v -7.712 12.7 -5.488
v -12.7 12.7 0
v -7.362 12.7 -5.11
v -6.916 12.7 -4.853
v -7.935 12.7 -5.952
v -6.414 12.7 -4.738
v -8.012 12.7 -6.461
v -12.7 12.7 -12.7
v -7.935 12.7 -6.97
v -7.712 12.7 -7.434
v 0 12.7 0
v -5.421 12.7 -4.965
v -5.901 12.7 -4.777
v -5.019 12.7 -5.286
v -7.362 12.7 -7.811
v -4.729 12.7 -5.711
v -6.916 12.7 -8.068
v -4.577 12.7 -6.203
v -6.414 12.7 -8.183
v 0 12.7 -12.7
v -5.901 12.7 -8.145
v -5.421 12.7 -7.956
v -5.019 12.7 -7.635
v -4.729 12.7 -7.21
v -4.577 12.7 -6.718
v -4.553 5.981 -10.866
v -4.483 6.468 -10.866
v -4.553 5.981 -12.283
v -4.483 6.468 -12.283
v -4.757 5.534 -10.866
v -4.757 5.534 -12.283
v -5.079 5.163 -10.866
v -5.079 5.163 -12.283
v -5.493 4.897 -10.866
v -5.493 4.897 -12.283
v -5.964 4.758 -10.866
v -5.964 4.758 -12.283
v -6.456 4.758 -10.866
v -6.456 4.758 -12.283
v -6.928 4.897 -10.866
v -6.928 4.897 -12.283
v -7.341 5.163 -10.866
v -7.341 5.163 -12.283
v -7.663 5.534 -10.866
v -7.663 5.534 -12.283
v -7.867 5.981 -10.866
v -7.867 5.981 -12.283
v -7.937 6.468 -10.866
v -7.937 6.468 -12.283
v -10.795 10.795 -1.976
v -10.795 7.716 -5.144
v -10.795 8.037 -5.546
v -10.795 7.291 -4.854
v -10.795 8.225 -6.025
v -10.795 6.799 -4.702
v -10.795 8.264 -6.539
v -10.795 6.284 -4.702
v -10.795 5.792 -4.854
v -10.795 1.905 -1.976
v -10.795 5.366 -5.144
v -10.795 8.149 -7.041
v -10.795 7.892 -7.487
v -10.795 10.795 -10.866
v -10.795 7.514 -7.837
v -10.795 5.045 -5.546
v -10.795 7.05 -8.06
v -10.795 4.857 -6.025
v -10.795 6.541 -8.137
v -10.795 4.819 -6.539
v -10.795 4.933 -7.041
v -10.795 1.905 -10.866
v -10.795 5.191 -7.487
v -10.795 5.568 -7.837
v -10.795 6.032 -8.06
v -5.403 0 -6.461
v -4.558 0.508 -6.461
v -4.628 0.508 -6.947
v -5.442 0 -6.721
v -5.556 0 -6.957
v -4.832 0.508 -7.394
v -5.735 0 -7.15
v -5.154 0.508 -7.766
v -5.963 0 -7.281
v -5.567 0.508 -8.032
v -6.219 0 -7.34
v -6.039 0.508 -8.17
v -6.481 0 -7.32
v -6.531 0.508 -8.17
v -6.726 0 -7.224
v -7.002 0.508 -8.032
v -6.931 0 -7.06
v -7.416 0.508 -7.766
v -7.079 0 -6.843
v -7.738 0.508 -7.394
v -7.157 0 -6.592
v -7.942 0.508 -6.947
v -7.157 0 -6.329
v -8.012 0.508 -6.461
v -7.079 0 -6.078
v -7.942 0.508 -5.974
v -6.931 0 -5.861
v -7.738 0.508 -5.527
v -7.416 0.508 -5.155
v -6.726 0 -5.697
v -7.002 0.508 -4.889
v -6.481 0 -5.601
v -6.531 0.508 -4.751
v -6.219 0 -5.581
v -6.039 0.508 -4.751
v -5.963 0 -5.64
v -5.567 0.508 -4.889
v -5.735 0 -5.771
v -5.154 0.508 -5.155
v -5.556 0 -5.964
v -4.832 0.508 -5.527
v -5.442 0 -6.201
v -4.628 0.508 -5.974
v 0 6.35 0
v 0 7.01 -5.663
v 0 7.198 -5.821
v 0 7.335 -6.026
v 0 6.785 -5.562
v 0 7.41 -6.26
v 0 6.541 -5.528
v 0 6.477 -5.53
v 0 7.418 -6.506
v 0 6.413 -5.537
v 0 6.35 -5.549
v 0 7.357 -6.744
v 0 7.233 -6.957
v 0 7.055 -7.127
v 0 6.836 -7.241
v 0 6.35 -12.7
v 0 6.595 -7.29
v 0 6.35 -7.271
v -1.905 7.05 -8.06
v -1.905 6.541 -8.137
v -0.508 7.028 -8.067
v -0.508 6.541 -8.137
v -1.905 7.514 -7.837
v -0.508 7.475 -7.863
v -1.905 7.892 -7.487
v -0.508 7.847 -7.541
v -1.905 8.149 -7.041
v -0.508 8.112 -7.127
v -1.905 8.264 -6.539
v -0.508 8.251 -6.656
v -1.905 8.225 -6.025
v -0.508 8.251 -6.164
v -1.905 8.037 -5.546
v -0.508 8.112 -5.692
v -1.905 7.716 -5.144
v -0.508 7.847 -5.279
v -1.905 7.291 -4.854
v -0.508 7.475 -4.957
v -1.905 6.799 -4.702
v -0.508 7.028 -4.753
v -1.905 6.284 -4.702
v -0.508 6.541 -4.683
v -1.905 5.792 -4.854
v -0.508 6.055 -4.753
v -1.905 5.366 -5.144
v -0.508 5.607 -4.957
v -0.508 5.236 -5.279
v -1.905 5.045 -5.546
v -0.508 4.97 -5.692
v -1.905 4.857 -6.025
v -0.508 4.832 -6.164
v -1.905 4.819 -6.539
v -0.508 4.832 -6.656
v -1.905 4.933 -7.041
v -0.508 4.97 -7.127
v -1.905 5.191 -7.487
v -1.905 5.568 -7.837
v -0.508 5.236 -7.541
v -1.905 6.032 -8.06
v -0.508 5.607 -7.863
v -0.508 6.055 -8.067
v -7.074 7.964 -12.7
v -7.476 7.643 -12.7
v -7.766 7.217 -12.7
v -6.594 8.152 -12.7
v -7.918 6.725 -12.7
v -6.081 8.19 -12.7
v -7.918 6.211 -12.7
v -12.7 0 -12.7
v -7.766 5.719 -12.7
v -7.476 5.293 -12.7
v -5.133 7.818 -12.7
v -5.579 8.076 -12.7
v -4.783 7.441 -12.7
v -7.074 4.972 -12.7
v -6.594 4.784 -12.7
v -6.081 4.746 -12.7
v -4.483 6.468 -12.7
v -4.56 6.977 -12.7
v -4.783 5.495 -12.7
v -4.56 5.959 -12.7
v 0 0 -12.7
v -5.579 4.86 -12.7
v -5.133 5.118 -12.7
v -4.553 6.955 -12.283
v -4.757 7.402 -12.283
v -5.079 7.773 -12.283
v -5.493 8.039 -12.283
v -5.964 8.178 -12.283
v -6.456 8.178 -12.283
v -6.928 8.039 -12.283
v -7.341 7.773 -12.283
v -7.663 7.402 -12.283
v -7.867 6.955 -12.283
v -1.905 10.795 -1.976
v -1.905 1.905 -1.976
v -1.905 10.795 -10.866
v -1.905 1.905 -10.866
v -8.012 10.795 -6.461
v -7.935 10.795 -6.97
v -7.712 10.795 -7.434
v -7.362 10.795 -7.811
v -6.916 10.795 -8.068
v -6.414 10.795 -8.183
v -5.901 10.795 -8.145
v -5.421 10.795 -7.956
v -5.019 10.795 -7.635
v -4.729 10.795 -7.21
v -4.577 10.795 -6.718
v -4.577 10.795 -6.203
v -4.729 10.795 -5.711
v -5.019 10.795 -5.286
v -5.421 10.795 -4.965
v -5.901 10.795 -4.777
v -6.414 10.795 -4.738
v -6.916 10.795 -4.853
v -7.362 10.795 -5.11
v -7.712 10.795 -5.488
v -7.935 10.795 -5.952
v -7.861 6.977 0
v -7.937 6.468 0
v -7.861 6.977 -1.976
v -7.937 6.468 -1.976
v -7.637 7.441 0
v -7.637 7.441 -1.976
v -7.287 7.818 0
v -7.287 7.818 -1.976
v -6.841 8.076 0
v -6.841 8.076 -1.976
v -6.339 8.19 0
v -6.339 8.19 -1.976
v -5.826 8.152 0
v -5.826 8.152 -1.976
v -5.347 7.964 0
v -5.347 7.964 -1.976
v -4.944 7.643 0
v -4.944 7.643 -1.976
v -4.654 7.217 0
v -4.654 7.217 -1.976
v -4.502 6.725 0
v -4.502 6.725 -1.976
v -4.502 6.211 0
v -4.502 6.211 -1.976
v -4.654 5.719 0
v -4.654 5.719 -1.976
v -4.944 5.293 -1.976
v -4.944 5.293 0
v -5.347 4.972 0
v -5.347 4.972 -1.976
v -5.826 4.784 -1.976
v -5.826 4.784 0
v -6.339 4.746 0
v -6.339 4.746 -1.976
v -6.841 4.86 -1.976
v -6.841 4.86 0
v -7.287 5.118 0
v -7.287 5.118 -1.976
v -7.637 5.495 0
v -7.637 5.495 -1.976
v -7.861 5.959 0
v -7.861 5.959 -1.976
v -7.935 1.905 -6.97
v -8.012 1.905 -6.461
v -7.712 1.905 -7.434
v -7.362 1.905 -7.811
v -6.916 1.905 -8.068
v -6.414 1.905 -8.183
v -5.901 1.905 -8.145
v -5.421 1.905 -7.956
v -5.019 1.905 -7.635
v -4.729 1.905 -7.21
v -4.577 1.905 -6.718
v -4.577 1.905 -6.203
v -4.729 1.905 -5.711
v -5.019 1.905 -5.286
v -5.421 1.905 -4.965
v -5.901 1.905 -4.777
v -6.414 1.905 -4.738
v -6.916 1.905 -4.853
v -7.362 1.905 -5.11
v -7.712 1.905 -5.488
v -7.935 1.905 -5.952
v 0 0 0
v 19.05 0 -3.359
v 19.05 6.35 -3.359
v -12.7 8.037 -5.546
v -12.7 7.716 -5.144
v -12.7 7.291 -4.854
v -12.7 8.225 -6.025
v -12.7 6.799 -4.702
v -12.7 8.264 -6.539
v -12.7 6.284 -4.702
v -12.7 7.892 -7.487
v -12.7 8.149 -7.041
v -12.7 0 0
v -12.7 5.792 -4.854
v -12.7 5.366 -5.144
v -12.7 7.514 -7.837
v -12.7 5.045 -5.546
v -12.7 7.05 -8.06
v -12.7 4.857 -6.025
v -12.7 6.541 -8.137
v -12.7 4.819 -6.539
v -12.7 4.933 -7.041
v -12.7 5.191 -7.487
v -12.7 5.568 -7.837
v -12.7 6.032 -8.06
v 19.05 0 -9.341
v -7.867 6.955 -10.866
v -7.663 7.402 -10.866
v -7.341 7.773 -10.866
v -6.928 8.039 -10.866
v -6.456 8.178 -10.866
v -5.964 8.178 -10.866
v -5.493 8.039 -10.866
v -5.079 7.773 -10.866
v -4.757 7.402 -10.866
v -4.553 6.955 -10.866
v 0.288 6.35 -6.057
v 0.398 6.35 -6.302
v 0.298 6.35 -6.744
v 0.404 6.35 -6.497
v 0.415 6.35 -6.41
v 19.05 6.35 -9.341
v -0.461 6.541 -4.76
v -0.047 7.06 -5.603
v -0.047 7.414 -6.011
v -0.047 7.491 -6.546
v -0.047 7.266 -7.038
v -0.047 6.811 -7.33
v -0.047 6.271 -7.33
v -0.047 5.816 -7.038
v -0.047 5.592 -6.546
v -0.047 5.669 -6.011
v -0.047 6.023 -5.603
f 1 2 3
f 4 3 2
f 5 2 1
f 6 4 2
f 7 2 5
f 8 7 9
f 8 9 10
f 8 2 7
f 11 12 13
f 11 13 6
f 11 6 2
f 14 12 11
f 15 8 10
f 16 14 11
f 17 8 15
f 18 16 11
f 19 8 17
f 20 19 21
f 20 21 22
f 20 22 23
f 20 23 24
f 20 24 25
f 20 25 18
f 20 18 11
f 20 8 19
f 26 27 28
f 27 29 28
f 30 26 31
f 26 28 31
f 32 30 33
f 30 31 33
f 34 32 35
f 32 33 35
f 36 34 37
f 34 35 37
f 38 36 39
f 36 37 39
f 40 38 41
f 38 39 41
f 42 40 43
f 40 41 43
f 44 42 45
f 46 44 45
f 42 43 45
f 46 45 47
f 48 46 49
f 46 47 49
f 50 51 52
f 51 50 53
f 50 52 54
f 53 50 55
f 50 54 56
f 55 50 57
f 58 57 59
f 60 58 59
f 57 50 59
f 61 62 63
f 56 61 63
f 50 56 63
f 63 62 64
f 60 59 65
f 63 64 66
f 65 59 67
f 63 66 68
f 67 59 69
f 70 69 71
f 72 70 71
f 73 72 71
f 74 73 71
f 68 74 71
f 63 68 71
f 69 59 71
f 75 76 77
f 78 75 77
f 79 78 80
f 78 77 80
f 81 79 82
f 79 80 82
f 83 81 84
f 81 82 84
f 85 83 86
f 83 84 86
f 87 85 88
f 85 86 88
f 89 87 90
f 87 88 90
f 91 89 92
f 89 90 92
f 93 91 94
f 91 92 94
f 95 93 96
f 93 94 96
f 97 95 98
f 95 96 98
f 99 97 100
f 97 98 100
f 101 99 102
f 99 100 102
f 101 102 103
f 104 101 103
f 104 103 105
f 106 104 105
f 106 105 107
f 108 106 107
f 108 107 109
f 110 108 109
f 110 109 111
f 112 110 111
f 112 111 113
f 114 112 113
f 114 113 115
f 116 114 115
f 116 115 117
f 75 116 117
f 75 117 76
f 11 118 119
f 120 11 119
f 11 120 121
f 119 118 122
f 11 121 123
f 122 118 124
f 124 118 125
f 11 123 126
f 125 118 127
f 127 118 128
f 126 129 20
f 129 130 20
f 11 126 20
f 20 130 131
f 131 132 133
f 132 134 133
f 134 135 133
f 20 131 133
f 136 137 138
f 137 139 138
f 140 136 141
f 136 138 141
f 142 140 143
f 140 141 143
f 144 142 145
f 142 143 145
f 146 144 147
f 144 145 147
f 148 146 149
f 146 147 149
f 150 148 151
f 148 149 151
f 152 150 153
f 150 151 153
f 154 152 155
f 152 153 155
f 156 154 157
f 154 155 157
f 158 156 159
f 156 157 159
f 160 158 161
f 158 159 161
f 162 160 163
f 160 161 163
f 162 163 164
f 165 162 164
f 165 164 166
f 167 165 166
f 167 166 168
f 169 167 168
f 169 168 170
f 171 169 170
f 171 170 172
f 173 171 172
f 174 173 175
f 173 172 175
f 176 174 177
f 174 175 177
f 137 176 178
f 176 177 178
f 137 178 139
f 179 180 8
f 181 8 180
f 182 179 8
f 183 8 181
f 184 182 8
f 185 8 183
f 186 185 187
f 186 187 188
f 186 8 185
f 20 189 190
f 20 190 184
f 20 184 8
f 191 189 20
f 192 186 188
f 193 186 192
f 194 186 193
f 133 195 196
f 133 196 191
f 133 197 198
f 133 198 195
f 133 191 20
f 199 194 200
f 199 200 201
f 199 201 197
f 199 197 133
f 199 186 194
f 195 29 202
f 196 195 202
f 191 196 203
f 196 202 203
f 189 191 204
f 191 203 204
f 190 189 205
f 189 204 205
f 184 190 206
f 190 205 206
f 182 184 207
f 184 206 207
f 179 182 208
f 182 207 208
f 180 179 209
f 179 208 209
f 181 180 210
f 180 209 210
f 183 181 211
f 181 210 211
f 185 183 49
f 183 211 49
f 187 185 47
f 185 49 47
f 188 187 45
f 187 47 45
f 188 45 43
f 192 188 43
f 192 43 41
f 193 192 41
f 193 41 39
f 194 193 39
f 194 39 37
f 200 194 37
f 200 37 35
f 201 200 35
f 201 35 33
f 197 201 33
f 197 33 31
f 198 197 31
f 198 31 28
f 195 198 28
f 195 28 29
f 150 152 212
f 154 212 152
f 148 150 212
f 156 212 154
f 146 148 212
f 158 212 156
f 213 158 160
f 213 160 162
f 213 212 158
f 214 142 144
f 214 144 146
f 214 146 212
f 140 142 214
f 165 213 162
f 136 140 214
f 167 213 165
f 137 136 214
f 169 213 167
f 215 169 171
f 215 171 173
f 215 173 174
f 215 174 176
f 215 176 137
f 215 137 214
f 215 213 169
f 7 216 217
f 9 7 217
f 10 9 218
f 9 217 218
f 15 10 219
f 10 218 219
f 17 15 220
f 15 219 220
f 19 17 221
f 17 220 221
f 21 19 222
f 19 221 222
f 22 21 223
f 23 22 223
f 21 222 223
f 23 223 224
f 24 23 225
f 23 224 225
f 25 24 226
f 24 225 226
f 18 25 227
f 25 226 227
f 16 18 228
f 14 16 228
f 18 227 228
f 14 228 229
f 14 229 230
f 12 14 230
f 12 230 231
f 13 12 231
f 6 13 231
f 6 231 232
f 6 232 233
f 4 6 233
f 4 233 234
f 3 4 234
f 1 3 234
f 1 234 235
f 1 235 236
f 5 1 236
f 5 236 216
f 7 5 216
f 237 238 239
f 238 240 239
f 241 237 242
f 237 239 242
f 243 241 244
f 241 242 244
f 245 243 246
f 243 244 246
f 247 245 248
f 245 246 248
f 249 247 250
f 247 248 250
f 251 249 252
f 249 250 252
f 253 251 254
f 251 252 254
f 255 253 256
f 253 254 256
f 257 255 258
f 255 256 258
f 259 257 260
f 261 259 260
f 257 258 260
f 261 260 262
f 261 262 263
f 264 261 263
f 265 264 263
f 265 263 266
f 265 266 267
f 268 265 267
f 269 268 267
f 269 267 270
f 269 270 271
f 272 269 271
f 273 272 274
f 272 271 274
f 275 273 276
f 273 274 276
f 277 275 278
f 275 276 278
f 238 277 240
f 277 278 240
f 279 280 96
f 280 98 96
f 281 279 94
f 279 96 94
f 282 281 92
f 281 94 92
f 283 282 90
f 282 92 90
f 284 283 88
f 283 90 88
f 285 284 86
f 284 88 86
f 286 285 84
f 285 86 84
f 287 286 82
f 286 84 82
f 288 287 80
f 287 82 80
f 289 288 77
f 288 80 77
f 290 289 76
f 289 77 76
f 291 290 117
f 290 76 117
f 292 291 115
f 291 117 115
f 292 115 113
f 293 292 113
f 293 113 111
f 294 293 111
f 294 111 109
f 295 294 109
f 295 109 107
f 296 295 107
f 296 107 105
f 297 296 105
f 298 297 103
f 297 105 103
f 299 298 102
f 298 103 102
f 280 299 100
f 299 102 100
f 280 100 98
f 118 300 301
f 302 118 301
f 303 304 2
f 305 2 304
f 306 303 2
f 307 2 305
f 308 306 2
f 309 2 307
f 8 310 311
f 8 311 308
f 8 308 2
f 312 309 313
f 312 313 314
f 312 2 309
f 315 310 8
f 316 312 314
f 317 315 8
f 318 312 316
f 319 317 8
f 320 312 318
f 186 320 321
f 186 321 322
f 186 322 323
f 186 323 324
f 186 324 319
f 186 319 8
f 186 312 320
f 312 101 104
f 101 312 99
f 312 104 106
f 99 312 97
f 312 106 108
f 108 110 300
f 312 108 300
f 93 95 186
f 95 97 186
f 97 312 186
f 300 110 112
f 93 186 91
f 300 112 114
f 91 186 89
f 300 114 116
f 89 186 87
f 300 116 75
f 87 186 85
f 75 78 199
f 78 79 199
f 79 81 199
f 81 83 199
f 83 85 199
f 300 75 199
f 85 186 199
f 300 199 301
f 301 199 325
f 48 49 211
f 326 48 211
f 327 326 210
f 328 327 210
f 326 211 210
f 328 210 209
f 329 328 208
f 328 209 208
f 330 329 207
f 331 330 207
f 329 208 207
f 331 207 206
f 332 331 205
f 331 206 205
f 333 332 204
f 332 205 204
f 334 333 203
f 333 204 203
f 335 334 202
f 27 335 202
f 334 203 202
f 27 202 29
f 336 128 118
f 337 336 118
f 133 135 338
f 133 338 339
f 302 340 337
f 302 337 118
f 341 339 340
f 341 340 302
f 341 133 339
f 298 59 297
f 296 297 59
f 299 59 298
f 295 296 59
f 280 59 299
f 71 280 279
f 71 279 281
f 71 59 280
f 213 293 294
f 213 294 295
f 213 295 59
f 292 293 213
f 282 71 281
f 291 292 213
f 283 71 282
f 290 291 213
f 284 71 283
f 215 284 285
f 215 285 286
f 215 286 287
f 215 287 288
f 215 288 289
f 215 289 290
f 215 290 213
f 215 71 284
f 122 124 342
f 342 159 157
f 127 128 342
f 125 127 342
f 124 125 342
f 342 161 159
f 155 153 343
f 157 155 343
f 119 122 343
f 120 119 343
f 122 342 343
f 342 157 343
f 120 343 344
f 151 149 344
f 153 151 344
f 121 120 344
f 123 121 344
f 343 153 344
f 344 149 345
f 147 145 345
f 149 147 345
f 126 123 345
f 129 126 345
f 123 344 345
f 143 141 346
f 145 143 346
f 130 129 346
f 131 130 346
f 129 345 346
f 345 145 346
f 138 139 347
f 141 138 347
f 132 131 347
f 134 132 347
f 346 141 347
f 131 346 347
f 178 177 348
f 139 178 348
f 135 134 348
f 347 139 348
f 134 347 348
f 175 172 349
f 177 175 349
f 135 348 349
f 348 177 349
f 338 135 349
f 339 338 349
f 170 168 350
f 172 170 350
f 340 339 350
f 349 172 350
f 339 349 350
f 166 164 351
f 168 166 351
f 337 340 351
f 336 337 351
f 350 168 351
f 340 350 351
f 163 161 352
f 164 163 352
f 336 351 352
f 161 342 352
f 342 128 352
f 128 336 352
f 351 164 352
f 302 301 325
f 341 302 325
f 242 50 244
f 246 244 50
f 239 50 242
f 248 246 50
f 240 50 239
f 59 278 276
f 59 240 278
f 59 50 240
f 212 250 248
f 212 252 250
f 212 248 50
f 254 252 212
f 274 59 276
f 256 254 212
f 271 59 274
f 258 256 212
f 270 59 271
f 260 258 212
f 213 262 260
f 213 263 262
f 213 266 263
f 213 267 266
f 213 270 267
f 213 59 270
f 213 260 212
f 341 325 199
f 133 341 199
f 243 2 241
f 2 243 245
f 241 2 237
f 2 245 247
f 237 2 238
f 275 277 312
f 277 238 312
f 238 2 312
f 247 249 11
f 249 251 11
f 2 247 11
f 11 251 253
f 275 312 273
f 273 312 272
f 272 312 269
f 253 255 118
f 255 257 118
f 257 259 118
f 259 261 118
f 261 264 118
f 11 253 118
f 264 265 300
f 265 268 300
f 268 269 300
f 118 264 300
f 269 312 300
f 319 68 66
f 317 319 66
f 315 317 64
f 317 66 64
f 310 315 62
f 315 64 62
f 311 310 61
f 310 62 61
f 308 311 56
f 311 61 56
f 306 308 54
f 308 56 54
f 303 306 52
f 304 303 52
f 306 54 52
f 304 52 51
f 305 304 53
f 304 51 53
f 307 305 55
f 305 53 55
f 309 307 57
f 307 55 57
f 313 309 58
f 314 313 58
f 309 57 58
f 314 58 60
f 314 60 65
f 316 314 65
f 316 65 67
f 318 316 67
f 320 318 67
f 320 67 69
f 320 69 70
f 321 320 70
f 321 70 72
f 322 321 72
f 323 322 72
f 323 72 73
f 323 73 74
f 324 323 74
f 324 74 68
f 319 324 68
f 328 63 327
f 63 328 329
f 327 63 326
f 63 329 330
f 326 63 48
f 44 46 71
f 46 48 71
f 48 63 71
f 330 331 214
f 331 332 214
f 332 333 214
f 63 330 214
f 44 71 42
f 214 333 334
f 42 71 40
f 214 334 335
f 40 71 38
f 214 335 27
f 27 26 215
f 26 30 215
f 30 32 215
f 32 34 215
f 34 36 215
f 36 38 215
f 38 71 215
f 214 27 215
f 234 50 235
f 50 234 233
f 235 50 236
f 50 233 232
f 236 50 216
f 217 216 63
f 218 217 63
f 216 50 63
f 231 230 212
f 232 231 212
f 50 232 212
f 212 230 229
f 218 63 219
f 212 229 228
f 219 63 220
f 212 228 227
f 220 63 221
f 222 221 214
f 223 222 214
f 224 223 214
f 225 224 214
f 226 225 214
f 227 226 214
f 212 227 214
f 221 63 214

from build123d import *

# Parameters (mm, degrees)
BOSS_EXTRUDE1_DEPTH       = 6.35
SKETCH2_W                 = 12.7
SKETCH2_H                 = 12.7
BOSS_EXTRUDE2_DEPTH       = 12.7
CUT_EXTRUDE1_DEPTH        = 4.445
CUT_EXTRUDE1_DEPTH_BACK   = 4.445
CUT_EXTRUDE1_START        = 6.35
SKETCH3_W                 = 8.89
SKETCH3_H                 = 8.89
F_8_32_TAPPED_HOLE1_D     = 3.4544
F_8_32_TAPPED_HOLE1_DEPTH = 12.28344
F_8_32_TAPPED_HOLE1_TIP   = 1.037806461
F_8_32_TAPPED_HOLE2_D     = 3.4544
F_8_32_TAPPED_HOLE2_DEPTH = 12.192
F_8_32_TAPPED_HOLE2_TIP   = 1.037806461
F_8_32_TAPPED_HOLE3_D     = 3.4544
F_8_32_TAPPED_HOLE3_DEPTH = 12.192
F_8_32_TAPPED_HOLE3_TIP   = 1.037806461
F_8_32_TAPPED_HOLE4_D     = 3.4544
F_8_32_TAPPED_HOLE4_DEPTH = 12.192
F_8_32_TAPPED_HOLE4_TIP   = 1.037806461


with BuildPart() as part:
    # Sketch1 → Boss-Extrude1 (new body)
    with BuildSketch(Plane(origin=(0, 0, 0), x_dir=(1, 0, 0), z_dir=(0, 1, 0))):
        Polygon((0, 0), (19.05, 3.359028982), (19.05, 9.340971018), (0, 12.7), align=None)
    extrude(amount=BOSS_EXTRUDE1_DEPTH)

    # Sketch2 → Boss-Extrude2 (add)
    with BuildSketch(Plane(origin=(0, 0, 0), x_dir=(1, 0, 0), z_dir=(0, 1, 0))):
        with Locations((-6.35, 6.35)):
            Rectangle(SKETCH2_W, SKETCH2_H)
    extrude(amount=BOSS_EXTRUDE2_DEPTH)

    # Sketch3 → Cut-Extrude1 (cut, two sides: drawn at the far end of the back side and taken through both)
    with BuildSketch(Plane(origin=(0, 0, 0), x_dir=(1, 0, 0), z_dir=(0, 1, 0)).offset(CUT_EXTRUDE1_START - CUT_EXTRUDE1_DEPTH_BACK)):
        with Locations((-6.35, 6.421317362)):
            Rectangle(SKETCH3_W, SKETCH3_H)
    extrude(amount=CUT_EXTRUDE1_DEPTH + CUT_EXTRUDE1_DEPTH_BACK, mode=Mode.SUBTRACT)

    # #8-32 Tapped Hole1
    with Locations(Plane.XY):
        with Locations((-6.210106544, 6.467962425), (-17.791429467, 4.563139576)):
            Hole(F_8_32_TAPPED_HOLE1_D / 2, depth=F_8_32_TAPPED_HOLE1_DEPTH)
            with Locations((0, 0, -(F_8_32_TAPPED_HOLE1_DEPTH + F_8_32_TAPPED_HOLE1_TIP / 2))):  # 118° drill point
                Cone(0, F_8_32_TAPPED_HOLE1_D / 2, F_8_32_TAPPED_HOLE1_TIP, mode=Mode.SUBTRACT)

    # #8-32 Tapped Hole2
    with Locations(Plane(origin=(0, 0, -12.7), x_dir=(-1, 0, 0), z_dir=(0, 0, -1))):
        with Locations((6.210106544, 6.467962425)):
            Hole(F_8_32_TAPPED_HOLE2_D / 2, depth=F_8_32_TAPPED_HOLE2_DEPTH)
            with Locations((0, 0, -(F_8_32_TAPPED_HOLE2_DEPTH + F_8_32_TAPPED_HOLE2_TIP / 2))):  # 118° drill point
                Cone(0, F_8_32_TAPPED_HOLE2_D / 2, F_8_32_TAPPED_HOLE2_TIP, mode=Mode.SUBTRACT)

    # #8-32 Tapped Hole3
    with Locations(Plane(origin=(0, 12.7, 0), x_dir=(1, 0, 0), z_dir=(0, 1, 0))):
        with Locations((-6.284915842, 6.460616317)):
            Hole(F_8_32_TAPPED_HOLE3_D / 2, depth=F_8_32_TAPPED_HOLE3_DEPTH)
            with Locations((0, 0, -(F_8_32_TAPPED_HOLE3_DEPTH + F_8_32_TAPPED_HOLE3_TIP / 2))):  # 118° drill point
                Cone(0, F_8_32_TAPPED_HOLE3_D / 2, F_8_32_TAPPED_HOLE3_TIP, mode=Mode.SUBTRACT)

    # #8-32 Tapped Hole4
    with Locations(Plane.ZY.offset(12.7)):
        with Locations((-6.409821041, 6.541174093)):
            Hole(F_8_32_TAPPED_HOLE4_D / 2, depth=F_8_32_TAPPED_HOLE4_DEPTH)
            with Locations((0, 0, -(F_8_32_TAPPED_HOLE4_DEPTH + F_8_32_TAPPED_HOLE4_TIP / 2))):  # 118° drill point
                Cone(0, F_8_32_TAPPED_HOLE4_D / 2, F_8_32_TAPPED_HOLE4_TIP, mode=Mode.SUBTRACT)


solid = part.part
